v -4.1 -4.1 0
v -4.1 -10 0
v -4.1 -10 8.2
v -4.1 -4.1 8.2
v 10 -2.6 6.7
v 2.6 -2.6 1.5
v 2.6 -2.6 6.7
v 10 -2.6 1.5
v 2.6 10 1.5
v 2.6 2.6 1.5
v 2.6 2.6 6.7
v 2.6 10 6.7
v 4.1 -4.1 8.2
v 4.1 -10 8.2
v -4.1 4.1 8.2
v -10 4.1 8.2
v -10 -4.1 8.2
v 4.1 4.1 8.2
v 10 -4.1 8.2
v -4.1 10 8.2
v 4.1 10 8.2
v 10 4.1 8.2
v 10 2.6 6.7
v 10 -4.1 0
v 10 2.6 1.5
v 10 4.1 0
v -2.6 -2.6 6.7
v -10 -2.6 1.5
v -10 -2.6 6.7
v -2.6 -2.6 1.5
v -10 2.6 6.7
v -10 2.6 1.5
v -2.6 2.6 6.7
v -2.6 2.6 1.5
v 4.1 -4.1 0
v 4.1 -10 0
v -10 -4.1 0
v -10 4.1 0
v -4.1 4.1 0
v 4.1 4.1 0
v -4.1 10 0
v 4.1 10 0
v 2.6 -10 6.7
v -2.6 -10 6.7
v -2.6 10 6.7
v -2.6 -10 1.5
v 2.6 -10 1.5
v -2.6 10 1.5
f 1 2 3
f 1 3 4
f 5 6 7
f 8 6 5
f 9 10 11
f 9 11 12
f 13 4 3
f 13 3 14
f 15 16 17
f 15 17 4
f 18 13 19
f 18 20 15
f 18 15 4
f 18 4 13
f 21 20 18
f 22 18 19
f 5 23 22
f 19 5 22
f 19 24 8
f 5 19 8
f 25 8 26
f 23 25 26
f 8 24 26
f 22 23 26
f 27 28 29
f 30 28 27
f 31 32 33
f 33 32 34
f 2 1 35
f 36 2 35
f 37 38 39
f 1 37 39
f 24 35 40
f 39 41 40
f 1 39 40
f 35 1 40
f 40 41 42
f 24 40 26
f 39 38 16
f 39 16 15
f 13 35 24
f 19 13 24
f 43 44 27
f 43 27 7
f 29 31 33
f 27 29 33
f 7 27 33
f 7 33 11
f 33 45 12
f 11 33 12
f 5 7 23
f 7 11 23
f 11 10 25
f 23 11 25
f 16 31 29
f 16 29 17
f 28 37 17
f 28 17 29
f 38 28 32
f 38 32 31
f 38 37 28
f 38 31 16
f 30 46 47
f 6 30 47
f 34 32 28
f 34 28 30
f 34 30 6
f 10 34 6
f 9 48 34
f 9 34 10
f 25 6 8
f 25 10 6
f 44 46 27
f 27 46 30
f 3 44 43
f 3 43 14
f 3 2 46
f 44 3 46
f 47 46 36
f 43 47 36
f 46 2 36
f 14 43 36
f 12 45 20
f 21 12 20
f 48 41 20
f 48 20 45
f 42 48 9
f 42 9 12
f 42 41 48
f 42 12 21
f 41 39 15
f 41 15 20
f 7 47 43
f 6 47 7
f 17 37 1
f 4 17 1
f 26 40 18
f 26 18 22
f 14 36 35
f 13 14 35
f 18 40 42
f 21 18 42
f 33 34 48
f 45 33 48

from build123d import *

# Parameters (mm, degrees)
SKETCH1_W           = 5.9
SKETCH1_H           = 8.2
SKETCH1_W_2         = 8.2
SKETCH1_H_2         = 5.9
BOSS_EXTRUDE1_DEPTH = 8.2
SHELL1_T            = -1.5


with BuildPart() as part:
    # Sketch1 → Boss-Extrude1 (new body)
    with BuildSketch(Plane.XY):
        with Locations((-7.05, 0)):
            Rectangle(SKETCH1_W, SKETCH1_H)
        with Locations((0, 7.05)):
            Rectangle(SKETCH1_W_2, SKETCH1_H_2)
        Rectangle(SKETCH1_W_2, SKETCH1_H)
        with Locations((7.05, 0)):
            Rectangle(SKETCH1_W, SKETCH1_H)
        with Locations((0, -7.05)):
            Rectangle(SKETCH1_W_2, SKETCH1_H_2)
    extrude(amount=BOSS_EXTRUDE1_DEPTH)

    # Shell1
    shell1_openings = [part.faces().sort_by_distance(p)[0] for p in [
        (0, 10, 4.1),
        (10, 0, 4.1),
        (0, -10, 4.1),
        (-10, 0, 4.1),
    ]]
    offset(amount=SHELL1_T, openings=shell1_openings, kind=Kind.INTERSECTION)


solid = part.part
